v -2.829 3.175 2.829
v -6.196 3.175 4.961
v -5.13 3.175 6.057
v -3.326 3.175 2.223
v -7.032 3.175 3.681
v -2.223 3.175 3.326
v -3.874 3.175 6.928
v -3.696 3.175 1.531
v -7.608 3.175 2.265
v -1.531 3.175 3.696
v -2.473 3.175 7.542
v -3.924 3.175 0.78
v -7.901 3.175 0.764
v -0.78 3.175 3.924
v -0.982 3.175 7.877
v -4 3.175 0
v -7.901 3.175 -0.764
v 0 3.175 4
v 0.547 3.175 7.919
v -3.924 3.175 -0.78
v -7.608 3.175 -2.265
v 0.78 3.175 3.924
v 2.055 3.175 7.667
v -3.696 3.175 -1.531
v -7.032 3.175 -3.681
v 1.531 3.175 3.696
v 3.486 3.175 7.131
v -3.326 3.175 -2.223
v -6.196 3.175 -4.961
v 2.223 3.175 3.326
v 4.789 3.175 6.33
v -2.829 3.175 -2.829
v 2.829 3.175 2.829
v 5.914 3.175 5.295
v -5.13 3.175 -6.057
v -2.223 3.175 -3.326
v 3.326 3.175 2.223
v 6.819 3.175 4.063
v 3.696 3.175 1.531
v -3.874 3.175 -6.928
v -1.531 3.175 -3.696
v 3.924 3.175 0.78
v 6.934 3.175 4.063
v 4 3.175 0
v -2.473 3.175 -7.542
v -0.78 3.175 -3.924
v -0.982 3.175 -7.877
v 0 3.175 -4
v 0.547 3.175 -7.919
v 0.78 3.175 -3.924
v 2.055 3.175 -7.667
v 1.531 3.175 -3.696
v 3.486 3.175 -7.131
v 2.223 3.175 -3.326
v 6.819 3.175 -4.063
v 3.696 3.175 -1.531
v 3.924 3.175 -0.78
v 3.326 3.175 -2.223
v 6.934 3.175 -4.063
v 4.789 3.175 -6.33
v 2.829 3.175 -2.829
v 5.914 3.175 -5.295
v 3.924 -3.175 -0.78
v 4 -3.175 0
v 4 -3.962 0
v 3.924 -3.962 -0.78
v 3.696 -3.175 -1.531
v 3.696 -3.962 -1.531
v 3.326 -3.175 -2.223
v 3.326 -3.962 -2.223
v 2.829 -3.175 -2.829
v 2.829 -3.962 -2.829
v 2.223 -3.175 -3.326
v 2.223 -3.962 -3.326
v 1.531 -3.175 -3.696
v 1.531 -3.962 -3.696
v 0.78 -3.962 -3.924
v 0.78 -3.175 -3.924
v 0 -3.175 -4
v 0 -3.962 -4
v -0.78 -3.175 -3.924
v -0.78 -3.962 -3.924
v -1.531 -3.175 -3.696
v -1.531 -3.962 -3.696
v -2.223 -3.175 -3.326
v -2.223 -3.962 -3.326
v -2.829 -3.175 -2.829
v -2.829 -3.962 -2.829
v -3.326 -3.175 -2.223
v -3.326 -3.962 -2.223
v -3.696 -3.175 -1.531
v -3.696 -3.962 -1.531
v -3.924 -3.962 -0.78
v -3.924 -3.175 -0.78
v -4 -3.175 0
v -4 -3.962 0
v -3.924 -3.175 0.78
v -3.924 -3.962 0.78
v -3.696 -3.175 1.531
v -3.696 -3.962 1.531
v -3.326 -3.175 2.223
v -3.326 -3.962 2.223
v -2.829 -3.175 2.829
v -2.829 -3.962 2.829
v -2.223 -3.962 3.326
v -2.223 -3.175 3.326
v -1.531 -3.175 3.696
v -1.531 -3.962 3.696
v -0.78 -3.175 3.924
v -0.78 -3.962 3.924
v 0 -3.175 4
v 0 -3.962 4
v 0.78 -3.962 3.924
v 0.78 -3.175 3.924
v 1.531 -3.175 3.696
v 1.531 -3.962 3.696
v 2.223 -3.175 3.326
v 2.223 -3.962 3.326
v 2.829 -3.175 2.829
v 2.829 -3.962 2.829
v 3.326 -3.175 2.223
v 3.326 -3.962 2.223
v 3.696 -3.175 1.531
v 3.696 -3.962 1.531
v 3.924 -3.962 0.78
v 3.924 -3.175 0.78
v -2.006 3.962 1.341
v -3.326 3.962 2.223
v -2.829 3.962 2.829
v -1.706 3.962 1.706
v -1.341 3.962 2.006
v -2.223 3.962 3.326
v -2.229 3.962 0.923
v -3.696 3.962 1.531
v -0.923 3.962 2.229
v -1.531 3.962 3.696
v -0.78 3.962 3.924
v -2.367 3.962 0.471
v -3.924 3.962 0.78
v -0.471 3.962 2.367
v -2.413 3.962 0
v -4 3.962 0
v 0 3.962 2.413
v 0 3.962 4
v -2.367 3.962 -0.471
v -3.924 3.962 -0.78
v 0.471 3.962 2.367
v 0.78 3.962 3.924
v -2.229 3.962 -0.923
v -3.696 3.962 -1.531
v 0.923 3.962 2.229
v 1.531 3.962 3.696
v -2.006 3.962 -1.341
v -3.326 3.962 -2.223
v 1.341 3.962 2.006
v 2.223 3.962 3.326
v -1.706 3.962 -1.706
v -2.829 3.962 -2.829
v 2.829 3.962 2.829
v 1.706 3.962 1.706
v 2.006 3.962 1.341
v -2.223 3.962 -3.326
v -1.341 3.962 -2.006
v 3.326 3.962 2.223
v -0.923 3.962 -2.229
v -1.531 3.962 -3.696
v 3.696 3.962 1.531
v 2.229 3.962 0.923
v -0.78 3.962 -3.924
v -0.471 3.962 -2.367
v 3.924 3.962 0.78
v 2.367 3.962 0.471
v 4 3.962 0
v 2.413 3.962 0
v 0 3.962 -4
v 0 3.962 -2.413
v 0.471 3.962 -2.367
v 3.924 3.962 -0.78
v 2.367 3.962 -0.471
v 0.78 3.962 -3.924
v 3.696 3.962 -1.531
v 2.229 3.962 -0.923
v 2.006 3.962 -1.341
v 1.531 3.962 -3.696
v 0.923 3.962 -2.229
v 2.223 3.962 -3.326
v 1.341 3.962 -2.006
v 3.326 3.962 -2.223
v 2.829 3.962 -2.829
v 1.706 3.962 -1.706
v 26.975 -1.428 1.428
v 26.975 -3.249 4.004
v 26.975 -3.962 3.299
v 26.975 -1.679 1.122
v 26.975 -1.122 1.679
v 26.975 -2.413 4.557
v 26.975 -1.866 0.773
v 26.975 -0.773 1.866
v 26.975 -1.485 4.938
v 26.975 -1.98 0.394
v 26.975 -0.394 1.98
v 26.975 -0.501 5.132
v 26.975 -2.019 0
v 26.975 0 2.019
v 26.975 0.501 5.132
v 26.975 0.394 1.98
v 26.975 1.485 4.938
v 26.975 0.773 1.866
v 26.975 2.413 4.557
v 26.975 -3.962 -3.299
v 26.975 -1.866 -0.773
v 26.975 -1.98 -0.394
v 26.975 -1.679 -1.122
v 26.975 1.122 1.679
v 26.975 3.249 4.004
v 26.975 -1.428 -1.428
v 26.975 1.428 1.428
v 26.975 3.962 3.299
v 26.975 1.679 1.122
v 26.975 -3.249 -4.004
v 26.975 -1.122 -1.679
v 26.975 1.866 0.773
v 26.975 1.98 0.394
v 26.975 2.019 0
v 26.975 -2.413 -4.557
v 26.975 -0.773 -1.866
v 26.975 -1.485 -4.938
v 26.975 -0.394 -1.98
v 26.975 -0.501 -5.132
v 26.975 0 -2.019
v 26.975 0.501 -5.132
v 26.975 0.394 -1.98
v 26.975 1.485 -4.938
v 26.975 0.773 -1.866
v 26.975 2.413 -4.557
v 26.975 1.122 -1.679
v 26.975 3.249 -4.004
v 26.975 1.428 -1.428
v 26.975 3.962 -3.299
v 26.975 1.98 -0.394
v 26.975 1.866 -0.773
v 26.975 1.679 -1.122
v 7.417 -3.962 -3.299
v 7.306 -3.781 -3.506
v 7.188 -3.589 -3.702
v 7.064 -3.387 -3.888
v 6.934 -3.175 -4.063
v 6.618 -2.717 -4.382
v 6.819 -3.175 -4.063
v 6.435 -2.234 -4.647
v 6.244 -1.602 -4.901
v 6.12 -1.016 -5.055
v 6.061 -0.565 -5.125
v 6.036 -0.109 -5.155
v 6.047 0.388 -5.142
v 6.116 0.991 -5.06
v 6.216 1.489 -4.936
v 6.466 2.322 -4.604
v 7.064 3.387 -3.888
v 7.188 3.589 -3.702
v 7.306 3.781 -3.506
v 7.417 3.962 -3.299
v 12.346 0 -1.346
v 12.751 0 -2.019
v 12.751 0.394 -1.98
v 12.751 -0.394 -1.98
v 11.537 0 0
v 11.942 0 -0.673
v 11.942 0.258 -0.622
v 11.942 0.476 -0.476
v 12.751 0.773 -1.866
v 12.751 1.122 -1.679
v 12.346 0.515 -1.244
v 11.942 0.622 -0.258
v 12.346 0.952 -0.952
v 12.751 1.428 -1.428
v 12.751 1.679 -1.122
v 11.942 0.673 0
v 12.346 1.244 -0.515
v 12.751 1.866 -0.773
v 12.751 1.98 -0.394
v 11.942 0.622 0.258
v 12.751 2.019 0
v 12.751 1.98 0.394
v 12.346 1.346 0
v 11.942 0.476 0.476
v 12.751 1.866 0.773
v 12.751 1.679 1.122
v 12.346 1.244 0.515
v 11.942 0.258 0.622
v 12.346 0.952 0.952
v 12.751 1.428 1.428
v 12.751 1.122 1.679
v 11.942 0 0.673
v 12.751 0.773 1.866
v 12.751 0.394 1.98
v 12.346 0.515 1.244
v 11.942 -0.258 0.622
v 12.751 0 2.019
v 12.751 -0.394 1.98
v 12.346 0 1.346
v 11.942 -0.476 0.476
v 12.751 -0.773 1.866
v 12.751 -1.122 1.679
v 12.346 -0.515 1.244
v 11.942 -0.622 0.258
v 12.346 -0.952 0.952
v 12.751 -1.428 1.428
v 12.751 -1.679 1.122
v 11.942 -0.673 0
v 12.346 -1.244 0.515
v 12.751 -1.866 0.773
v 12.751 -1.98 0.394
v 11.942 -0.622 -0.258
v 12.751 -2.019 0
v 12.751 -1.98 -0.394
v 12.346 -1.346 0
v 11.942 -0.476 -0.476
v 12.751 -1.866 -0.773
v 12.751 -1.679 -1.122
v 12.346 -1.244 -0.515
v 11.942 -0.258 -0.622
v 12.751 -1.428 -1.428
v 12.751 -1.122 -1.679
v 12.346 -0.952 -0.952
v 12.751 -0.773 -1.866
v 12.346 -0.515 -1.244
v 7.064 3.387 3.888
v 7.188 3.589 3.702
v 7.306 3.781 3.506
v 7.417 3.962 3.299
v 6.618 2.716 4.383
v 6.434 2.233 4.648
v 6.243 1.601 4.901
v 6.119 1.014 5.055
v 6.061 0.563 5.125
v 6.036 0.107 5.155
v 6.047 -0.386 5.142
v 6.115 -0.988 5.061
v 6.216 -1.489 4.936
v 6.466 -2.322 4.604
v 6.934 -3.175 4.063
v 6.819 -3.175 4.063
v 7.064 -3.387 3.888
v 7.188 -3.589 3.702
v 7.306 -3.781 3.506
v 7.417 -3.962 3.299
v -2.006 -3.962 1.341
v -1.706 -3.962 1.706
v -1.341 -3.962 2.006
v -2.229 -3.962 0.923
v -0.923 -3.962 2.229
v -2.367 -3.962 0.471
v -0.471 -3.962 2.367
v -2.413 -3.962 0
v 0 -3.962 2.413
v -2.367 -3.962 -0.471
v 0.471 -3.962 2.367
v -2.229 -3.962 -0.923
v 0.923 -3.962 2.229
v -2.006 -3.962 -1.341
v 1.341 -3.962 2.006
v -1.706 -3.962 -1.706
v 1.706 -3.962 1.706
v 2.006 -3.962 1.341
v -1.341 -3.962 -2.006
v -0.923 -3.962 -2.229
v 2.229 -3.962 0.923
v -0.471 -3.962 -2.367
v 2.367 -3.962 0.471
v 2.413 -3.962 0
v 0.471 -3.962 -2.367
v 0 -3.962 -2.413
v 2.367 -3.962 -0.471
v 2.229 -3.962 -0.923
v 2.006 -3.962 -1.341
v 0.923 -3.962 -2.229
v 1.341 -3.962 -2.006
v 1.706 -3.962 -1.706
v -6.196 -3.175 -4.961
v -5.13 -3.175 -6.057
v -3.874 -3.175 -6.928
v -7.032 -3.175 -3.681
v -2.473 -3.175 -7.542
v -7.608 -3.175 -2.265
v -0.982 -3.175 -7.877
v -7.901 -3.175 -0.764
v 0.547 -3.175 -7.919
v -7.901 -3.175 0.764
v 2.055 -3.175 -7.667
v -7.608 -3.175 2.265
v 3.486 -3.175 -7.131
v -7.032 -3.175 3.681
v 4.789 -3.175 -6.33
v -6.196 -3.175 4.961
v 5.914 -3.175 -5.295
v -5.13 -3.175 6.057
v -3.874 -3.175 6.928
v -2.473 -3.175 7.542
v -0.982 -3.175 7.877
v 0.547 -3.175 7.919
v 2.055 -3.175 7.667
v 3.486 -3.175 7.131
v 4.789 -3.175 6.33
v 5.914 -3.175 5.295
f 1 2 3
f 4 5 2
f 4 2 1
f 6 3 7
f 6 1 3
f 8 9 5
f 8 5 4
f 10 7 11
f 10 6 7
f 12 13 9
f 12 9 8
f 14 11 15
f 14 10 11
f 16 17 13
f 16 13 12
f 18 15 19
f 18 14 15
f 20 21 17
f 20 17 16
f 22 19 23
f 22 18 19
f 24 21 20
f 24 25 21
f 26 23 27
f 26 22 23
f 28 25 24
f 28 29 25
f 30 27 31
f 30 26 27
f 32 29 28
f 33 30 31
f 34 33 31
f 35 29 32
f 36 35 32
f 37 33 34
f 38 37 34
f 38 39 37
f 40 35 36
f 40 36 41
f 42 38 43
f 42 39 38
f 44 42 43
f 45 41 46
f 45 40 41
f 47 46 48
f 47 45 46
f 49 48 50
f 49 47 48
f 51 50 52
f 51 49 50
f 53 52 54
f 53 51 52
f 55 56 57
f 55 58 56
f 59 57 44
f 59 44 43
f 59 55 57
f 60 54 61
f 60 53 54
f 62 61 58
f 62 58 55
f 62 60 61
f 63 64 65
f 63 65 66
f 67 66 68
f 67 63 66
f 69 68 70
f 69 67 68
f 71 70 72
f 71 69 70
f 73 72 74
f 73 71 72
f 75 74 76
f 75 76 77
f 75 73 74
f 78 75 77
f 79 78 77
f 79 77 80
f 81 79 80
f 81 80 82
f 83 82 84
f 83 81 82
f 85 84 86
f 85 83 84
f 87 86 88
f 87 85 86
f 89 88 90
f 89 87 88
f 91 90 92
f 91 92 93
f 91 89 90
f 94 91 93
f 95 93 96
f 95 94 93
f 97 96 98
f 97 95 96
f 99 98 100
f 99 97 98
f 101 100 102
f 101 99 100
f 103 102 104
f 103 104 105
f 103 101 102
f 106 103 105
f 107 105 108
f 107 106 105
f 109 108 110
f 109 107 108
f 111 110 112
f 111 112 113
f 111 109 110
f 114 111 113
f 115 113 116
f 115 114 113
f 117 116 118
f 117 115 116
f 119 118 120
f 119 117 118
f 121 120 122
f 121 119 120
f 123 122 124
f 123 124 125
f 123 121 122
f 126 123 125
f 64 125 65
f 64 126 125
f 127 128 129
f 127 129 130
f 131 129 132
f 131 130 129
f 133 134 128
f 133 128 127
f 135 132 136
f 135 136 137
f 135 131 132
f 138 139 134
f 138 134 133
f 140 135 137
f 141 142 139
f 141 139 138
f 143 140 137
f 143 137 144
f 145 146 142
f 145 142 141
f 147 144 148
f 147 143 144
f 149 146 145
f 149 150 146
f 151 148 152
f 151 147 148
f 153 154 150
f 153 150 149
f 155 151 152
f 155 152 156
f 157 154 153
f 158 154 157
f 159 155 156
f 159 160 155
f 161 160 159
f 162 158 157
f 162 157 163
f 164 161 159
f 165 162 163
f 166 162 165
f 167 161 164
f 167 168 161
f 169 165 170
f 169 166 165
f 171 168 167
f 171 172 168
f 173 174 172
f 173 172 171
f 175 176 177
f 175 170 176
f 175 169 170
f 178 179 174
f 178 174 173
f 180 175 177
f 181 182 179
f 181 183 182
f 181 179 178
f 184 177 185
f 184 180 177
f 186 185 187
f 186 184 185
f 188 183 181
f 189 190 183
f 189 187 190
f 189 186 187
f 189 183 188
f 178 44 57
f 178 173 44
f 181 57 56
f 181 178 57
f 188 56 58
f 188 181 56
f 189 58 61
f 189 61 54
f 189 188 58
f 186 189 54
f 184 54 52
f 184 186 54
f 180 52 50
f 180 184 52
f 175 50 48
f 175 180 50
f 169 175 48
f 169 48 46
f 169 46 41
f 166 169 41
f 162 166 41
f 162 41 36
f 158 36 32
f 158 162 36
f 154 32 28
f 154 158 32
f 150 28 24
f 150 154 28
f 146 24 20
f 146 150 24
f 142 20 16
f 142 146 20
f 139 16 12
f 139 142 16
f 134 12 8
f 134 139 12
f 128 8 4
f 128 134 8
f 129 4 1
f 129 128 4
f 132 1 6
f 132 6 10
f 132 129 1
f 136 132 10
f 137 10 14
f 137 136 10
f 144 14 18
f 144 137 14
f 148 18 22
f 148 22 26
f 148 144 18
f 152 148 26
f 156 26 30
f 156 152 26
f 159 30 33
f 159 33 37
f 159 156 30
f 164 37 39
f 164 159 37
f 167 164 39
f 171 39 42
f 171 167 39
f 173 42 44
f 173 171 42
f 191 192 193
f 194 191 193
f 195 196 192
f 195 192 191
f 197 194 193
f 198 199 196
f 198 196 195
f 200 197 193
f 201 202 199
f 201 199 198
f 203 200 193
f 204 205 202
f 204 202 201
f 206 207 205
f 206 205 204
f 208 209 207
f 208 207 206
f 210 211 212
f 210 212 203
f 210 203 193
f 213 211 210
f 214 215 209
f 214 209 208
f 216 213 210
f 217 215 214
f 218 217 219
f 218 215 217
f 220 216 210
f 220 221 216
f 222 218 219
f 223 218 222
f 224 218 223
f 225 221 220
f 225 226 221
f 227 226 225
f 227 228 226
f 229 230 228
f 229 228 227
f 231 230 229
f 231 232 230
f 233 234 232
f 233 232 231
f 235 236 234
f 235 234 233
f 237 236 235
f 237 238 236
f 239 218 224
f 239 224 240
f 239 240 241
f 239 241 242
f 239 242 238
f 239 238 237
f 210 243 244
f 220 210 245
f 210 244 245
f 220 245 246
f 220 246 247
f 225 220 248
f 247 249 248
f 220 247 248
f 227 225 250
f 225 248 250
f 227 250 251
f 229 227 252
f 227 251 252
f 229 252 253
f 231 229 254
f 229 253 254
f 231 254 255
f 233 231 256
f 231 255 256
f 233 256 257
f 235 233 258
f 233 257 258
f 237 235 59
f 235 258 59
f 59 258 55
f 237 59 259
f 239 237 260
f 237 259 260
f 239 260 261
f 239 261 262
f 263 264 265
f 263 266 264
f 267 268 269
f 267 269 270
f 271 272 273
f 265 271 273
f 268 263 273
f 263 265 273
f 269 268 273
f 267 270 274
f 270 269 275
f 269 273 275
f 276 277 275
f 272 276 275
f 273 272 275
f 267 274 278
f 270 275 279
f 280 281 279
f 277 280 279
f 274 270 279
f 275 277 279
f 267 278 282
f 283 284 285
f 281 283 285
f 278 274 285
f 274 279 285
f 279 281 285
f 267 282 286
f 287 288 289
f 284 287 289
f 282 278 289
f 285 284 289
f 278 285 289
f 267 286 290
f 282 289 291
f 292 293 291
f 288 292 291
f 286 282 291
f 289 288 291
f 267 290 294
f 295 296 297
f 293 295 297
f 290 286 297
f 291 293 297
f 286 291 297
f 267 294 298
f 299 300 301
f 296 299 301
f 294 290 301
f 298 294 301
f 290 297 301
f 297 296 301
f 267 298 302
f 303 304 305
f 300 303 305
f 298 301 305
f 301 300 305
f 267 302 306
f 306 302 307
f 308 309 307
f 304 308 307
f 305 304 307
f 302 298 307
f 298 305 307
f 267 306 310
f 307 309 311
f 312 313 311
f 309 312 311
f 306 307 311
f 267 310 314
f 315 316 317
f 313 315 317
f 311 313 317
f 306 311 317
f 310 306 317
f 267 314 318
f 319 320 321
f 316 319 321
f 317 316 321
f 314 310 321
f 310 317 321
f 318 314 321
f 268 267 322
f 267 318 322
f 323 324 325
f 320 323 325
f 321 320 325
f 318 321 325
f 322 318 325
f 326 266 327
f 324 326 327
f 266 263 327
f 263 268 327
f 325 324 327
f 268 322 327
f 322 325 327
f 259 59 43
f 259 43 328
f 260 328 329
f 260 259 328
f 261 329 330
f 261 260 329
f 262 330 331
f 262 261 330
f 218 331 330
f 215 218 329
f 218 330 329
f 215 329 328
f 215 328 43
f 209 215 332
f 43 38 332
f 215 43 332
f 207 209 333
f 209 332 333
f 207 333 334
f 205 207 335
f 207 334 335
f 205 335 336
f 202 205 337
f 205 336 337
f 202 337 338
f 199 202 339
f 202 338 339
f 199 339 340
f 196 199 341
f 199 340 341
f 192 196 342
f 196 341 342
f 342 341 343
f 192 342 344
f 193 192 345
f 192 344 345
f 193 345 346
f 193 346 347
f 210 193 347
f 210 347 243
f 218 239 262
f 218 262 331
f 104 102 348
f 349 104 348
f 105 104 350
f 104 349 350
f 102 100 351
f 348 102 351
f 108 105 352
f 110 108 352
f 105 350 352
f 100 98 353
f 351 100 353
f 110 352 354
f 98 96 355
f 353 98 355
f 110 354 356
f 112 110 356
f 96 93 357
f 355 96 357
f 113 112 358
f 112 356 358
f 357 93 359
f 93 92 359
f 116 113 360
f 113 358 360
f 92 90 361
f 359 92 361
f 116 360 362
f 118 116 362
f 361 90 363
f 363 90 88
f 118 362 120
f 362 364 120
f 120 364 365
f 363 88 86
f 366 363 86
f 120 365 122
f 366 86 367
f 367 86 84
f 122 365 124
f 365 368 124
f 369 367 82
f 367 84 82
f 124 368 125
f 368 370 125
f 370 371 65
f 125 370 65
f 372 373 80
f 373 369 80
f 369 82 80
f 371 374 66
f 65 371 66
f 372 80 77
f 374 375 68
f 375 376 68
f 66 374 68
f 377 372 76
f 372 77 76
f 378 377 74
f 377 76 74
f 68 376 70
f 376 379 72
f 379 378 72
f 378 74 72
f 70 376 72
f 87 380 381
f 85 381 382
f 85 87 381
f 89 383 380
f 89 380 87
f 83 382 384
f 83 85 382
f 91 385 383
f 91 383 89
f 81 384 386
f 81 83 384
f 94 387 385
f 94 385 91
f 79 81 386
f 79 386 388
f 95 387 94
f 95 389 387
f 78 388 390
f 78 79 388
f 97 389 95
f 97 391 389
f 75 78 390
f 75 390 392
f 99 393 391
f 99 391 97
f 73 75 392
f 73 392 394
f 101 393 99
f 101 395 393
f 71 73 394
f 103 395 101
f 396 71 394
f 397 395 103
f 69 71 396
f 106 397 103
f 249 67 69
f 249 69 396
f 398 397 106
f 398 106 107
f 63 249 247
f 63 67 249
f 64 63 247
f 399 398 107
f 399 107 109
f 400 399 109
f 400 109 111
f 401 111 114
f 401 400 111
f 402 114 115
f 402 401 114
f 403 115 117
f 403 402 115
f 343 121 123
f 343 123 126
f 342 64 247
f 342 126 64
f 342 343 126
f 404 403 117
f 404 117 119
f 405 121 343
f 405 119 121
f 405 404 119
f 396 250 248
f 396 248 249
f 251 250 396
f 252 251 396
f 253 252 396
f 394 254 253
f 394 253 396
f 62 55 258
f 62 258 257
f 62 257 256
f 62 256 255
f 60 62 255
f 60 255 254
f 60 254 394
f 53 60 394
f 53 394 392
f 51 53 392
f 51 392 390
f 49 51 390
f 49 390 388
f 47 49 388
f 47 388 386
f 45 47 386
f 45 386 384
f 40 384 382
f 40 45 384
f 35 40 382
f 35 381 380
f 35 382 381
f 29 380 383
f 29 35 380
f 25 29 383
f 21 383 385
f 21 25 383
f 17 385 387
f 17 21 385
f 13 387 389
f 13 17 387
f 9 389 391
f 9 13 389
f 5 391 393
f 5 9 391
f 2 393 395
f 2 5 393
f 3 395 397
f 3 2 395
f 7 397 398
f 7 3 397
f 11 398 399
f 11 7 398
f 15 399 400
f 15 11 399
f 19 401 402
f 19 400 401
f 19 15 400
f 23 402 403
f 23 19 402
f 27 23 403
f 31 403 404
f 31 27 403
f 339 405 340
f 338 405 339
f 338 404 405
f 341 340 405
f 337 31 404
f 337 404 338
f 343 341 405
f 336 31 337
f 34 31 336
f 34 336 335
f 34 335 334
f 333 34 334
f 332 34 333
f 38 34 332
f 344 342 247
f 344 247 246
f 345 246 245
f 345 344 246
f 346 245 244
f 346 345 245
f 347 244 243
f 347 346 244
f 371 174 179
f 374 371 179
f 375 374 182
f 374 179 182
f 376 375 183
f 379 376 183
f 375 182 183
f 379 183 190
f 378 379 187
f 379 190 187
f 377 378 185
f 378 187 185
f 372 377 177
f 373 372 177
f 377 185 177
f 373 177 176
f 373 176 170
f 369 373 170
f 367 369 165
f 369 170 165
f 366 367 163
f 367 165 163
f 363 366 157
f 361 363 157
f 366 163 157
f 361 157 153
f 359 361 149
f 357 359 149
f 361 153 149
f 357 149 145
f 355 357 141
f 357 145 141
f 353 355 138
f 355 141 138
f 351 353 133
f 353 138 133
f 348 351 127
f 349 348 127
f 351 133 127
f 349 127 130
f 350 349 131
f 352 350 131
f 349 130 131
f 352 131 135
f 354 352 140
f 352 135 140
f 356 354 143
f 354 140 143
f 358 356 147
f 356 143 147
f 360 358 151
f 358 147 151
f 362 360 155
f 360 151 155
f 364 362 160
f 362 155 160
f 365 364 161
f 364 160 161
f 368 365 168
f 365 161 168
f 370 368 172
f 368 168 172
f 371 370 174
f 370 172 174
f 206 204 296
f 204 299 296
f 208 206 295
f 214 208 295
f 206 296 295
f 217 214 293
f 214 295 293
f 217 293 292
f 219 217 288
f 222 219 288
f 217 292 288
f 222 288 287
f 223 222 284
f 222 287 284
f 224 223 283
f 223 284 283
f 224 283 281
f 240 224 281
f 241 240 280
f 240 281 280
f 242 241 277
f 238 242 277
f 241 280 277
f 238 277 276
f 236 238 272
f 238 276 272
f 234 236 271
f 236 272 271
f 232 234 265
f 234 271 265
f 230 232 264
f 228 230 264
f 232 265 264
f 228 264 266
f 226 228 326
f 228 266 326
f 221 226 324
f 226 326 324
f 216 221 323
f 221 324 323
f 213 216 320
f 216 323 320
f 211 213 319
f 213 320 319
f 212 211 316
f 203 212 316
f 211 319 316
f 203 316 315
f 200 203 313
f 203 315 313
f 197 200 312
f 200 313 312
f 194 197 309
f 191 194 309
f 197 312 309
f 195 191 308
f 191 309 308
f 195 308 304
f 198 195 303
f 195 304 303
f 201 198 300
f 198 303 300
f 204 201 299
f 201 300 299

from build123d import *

# Parameters (mm, degrees)
SKETCH1_R                  = 7.9375
HEAD_DIAMETER_DEPTH        = 3.175
BOSS_EXTRUDE4_DEPTH        = 26.9748
CUT_EXTRUDE2_DEPTH         = 7.9375
SKETCH9_R                  = 4.0005
BOSS_EXTRUDE5_DEPTH        = 3.9624
SKETCH10_R                 = 2.413
CUT_EXTRUDE3_DEPTH         = 7.9248
F_10_32_TAPPED_HOLE1_D     = 4.0386
F_10_32_TAPPED_HOLE1_DEPTH = 14.224
F_10_32_TAPPED_HOLE1_TIP   = 1.213317848


with BuildPart() as part:
    # Sketch1 → Head Diameter (new body, symmetric)
    with BuildSketch(Plane(origin=(0, 0, 0), x_dir=(1, 0, 0), z_dir=(0, 1, 0))):
        Circle(SKETCH1_R)
    extrude(amount=HEAD_DIAMETER_DEPTH, both=True)

    # Sketch7 → Boss-Extrude4 (add)
    with BuildSketch(Plane(origin=(0, 0, 0), x_dir=(0, 0, -1), z_dir=(1, 0, 0))):
        with BuildLine():
            Line((-3.299361253, -3.9624), (3.299361253, -3.9624))
            ThreePointArc((3.299361253, -3.9624), (5.1562, 0), (3.299361253, 3.9624))
            Line((3.299361253, 3.9624), (-3.299361253, 3.9624))
            ThreePointArc((-3.299361253, 3.9624), (-5.1562, 0), (-3.299361253, -3.9624))
        make_face()
    extrude(amount=BOSS_EXTRUDE4_DEPTH)

    # Sketch8 → Cut-Extrude2 (cut, symmetric)
    with BuildSketch(Plane.XY):
        Polygon((0, 3.9624), (0, 3.175), (6.9342, 3.175), (7.4168, 3.9624), align=None)
        Polygon((7.4168, -3.9624), (0, -3.9624), (0, -3.175), (6.9342, -3.175), align=None)
    extrude(amount=CUT_EXTRUDE2_DEPTH, both=True, mode=Mode.SUBTRACT)

    # Sketch9 → Boss-Extrude5 (add, symmetric)
    with BuildSketch(Plane(origin=(0, 0, 0), x_dir=(1, 0, 0), z_dir=(0, 1, 0))):
        Circle(SKETCH9_R)
    extrude(amount=BOSS_EXTRUDE5_DEPTH, both=True)

    # Sketch10 → Cut-Extrude3 (cut)
    with BuildSketch(Plane(origin=(0, 3.9624, 0), x_dir=(1, 0, 0), z_dir=(0, 1, 0))):
        Circle(SKETCH10_R)
    extrude(amount=-CUT_EXTRUDE3_DEPTH, mode=Mode.SUBTRACT)

    # #10-32 Tapped Hole1
    with Locations(Plane(origin=(26.9748, 0, 0), x_dir=(0, 0, -1), z_dir=(1, 0, 0))):
        with Locations((0, 0)):
            Hole(F_10_32_TAPPED_HOLE1_D / 2, depth=F_10_32_TAPPED_HOLE1_DEPTH)
            with Locations((0, 0, -(F_10_32_TAPPED_HOLE1_DEPTH + F_10_32_TAPPED_HOLE1_TIP / 2))):  # 118° drill point
                Cone(0, F_10_32_TAPPED_HOLE1_D / 2, F_10_32_TAPPED_HOLE1_TIP, mode=Mode.SUBTRACT)


solid = part.part
